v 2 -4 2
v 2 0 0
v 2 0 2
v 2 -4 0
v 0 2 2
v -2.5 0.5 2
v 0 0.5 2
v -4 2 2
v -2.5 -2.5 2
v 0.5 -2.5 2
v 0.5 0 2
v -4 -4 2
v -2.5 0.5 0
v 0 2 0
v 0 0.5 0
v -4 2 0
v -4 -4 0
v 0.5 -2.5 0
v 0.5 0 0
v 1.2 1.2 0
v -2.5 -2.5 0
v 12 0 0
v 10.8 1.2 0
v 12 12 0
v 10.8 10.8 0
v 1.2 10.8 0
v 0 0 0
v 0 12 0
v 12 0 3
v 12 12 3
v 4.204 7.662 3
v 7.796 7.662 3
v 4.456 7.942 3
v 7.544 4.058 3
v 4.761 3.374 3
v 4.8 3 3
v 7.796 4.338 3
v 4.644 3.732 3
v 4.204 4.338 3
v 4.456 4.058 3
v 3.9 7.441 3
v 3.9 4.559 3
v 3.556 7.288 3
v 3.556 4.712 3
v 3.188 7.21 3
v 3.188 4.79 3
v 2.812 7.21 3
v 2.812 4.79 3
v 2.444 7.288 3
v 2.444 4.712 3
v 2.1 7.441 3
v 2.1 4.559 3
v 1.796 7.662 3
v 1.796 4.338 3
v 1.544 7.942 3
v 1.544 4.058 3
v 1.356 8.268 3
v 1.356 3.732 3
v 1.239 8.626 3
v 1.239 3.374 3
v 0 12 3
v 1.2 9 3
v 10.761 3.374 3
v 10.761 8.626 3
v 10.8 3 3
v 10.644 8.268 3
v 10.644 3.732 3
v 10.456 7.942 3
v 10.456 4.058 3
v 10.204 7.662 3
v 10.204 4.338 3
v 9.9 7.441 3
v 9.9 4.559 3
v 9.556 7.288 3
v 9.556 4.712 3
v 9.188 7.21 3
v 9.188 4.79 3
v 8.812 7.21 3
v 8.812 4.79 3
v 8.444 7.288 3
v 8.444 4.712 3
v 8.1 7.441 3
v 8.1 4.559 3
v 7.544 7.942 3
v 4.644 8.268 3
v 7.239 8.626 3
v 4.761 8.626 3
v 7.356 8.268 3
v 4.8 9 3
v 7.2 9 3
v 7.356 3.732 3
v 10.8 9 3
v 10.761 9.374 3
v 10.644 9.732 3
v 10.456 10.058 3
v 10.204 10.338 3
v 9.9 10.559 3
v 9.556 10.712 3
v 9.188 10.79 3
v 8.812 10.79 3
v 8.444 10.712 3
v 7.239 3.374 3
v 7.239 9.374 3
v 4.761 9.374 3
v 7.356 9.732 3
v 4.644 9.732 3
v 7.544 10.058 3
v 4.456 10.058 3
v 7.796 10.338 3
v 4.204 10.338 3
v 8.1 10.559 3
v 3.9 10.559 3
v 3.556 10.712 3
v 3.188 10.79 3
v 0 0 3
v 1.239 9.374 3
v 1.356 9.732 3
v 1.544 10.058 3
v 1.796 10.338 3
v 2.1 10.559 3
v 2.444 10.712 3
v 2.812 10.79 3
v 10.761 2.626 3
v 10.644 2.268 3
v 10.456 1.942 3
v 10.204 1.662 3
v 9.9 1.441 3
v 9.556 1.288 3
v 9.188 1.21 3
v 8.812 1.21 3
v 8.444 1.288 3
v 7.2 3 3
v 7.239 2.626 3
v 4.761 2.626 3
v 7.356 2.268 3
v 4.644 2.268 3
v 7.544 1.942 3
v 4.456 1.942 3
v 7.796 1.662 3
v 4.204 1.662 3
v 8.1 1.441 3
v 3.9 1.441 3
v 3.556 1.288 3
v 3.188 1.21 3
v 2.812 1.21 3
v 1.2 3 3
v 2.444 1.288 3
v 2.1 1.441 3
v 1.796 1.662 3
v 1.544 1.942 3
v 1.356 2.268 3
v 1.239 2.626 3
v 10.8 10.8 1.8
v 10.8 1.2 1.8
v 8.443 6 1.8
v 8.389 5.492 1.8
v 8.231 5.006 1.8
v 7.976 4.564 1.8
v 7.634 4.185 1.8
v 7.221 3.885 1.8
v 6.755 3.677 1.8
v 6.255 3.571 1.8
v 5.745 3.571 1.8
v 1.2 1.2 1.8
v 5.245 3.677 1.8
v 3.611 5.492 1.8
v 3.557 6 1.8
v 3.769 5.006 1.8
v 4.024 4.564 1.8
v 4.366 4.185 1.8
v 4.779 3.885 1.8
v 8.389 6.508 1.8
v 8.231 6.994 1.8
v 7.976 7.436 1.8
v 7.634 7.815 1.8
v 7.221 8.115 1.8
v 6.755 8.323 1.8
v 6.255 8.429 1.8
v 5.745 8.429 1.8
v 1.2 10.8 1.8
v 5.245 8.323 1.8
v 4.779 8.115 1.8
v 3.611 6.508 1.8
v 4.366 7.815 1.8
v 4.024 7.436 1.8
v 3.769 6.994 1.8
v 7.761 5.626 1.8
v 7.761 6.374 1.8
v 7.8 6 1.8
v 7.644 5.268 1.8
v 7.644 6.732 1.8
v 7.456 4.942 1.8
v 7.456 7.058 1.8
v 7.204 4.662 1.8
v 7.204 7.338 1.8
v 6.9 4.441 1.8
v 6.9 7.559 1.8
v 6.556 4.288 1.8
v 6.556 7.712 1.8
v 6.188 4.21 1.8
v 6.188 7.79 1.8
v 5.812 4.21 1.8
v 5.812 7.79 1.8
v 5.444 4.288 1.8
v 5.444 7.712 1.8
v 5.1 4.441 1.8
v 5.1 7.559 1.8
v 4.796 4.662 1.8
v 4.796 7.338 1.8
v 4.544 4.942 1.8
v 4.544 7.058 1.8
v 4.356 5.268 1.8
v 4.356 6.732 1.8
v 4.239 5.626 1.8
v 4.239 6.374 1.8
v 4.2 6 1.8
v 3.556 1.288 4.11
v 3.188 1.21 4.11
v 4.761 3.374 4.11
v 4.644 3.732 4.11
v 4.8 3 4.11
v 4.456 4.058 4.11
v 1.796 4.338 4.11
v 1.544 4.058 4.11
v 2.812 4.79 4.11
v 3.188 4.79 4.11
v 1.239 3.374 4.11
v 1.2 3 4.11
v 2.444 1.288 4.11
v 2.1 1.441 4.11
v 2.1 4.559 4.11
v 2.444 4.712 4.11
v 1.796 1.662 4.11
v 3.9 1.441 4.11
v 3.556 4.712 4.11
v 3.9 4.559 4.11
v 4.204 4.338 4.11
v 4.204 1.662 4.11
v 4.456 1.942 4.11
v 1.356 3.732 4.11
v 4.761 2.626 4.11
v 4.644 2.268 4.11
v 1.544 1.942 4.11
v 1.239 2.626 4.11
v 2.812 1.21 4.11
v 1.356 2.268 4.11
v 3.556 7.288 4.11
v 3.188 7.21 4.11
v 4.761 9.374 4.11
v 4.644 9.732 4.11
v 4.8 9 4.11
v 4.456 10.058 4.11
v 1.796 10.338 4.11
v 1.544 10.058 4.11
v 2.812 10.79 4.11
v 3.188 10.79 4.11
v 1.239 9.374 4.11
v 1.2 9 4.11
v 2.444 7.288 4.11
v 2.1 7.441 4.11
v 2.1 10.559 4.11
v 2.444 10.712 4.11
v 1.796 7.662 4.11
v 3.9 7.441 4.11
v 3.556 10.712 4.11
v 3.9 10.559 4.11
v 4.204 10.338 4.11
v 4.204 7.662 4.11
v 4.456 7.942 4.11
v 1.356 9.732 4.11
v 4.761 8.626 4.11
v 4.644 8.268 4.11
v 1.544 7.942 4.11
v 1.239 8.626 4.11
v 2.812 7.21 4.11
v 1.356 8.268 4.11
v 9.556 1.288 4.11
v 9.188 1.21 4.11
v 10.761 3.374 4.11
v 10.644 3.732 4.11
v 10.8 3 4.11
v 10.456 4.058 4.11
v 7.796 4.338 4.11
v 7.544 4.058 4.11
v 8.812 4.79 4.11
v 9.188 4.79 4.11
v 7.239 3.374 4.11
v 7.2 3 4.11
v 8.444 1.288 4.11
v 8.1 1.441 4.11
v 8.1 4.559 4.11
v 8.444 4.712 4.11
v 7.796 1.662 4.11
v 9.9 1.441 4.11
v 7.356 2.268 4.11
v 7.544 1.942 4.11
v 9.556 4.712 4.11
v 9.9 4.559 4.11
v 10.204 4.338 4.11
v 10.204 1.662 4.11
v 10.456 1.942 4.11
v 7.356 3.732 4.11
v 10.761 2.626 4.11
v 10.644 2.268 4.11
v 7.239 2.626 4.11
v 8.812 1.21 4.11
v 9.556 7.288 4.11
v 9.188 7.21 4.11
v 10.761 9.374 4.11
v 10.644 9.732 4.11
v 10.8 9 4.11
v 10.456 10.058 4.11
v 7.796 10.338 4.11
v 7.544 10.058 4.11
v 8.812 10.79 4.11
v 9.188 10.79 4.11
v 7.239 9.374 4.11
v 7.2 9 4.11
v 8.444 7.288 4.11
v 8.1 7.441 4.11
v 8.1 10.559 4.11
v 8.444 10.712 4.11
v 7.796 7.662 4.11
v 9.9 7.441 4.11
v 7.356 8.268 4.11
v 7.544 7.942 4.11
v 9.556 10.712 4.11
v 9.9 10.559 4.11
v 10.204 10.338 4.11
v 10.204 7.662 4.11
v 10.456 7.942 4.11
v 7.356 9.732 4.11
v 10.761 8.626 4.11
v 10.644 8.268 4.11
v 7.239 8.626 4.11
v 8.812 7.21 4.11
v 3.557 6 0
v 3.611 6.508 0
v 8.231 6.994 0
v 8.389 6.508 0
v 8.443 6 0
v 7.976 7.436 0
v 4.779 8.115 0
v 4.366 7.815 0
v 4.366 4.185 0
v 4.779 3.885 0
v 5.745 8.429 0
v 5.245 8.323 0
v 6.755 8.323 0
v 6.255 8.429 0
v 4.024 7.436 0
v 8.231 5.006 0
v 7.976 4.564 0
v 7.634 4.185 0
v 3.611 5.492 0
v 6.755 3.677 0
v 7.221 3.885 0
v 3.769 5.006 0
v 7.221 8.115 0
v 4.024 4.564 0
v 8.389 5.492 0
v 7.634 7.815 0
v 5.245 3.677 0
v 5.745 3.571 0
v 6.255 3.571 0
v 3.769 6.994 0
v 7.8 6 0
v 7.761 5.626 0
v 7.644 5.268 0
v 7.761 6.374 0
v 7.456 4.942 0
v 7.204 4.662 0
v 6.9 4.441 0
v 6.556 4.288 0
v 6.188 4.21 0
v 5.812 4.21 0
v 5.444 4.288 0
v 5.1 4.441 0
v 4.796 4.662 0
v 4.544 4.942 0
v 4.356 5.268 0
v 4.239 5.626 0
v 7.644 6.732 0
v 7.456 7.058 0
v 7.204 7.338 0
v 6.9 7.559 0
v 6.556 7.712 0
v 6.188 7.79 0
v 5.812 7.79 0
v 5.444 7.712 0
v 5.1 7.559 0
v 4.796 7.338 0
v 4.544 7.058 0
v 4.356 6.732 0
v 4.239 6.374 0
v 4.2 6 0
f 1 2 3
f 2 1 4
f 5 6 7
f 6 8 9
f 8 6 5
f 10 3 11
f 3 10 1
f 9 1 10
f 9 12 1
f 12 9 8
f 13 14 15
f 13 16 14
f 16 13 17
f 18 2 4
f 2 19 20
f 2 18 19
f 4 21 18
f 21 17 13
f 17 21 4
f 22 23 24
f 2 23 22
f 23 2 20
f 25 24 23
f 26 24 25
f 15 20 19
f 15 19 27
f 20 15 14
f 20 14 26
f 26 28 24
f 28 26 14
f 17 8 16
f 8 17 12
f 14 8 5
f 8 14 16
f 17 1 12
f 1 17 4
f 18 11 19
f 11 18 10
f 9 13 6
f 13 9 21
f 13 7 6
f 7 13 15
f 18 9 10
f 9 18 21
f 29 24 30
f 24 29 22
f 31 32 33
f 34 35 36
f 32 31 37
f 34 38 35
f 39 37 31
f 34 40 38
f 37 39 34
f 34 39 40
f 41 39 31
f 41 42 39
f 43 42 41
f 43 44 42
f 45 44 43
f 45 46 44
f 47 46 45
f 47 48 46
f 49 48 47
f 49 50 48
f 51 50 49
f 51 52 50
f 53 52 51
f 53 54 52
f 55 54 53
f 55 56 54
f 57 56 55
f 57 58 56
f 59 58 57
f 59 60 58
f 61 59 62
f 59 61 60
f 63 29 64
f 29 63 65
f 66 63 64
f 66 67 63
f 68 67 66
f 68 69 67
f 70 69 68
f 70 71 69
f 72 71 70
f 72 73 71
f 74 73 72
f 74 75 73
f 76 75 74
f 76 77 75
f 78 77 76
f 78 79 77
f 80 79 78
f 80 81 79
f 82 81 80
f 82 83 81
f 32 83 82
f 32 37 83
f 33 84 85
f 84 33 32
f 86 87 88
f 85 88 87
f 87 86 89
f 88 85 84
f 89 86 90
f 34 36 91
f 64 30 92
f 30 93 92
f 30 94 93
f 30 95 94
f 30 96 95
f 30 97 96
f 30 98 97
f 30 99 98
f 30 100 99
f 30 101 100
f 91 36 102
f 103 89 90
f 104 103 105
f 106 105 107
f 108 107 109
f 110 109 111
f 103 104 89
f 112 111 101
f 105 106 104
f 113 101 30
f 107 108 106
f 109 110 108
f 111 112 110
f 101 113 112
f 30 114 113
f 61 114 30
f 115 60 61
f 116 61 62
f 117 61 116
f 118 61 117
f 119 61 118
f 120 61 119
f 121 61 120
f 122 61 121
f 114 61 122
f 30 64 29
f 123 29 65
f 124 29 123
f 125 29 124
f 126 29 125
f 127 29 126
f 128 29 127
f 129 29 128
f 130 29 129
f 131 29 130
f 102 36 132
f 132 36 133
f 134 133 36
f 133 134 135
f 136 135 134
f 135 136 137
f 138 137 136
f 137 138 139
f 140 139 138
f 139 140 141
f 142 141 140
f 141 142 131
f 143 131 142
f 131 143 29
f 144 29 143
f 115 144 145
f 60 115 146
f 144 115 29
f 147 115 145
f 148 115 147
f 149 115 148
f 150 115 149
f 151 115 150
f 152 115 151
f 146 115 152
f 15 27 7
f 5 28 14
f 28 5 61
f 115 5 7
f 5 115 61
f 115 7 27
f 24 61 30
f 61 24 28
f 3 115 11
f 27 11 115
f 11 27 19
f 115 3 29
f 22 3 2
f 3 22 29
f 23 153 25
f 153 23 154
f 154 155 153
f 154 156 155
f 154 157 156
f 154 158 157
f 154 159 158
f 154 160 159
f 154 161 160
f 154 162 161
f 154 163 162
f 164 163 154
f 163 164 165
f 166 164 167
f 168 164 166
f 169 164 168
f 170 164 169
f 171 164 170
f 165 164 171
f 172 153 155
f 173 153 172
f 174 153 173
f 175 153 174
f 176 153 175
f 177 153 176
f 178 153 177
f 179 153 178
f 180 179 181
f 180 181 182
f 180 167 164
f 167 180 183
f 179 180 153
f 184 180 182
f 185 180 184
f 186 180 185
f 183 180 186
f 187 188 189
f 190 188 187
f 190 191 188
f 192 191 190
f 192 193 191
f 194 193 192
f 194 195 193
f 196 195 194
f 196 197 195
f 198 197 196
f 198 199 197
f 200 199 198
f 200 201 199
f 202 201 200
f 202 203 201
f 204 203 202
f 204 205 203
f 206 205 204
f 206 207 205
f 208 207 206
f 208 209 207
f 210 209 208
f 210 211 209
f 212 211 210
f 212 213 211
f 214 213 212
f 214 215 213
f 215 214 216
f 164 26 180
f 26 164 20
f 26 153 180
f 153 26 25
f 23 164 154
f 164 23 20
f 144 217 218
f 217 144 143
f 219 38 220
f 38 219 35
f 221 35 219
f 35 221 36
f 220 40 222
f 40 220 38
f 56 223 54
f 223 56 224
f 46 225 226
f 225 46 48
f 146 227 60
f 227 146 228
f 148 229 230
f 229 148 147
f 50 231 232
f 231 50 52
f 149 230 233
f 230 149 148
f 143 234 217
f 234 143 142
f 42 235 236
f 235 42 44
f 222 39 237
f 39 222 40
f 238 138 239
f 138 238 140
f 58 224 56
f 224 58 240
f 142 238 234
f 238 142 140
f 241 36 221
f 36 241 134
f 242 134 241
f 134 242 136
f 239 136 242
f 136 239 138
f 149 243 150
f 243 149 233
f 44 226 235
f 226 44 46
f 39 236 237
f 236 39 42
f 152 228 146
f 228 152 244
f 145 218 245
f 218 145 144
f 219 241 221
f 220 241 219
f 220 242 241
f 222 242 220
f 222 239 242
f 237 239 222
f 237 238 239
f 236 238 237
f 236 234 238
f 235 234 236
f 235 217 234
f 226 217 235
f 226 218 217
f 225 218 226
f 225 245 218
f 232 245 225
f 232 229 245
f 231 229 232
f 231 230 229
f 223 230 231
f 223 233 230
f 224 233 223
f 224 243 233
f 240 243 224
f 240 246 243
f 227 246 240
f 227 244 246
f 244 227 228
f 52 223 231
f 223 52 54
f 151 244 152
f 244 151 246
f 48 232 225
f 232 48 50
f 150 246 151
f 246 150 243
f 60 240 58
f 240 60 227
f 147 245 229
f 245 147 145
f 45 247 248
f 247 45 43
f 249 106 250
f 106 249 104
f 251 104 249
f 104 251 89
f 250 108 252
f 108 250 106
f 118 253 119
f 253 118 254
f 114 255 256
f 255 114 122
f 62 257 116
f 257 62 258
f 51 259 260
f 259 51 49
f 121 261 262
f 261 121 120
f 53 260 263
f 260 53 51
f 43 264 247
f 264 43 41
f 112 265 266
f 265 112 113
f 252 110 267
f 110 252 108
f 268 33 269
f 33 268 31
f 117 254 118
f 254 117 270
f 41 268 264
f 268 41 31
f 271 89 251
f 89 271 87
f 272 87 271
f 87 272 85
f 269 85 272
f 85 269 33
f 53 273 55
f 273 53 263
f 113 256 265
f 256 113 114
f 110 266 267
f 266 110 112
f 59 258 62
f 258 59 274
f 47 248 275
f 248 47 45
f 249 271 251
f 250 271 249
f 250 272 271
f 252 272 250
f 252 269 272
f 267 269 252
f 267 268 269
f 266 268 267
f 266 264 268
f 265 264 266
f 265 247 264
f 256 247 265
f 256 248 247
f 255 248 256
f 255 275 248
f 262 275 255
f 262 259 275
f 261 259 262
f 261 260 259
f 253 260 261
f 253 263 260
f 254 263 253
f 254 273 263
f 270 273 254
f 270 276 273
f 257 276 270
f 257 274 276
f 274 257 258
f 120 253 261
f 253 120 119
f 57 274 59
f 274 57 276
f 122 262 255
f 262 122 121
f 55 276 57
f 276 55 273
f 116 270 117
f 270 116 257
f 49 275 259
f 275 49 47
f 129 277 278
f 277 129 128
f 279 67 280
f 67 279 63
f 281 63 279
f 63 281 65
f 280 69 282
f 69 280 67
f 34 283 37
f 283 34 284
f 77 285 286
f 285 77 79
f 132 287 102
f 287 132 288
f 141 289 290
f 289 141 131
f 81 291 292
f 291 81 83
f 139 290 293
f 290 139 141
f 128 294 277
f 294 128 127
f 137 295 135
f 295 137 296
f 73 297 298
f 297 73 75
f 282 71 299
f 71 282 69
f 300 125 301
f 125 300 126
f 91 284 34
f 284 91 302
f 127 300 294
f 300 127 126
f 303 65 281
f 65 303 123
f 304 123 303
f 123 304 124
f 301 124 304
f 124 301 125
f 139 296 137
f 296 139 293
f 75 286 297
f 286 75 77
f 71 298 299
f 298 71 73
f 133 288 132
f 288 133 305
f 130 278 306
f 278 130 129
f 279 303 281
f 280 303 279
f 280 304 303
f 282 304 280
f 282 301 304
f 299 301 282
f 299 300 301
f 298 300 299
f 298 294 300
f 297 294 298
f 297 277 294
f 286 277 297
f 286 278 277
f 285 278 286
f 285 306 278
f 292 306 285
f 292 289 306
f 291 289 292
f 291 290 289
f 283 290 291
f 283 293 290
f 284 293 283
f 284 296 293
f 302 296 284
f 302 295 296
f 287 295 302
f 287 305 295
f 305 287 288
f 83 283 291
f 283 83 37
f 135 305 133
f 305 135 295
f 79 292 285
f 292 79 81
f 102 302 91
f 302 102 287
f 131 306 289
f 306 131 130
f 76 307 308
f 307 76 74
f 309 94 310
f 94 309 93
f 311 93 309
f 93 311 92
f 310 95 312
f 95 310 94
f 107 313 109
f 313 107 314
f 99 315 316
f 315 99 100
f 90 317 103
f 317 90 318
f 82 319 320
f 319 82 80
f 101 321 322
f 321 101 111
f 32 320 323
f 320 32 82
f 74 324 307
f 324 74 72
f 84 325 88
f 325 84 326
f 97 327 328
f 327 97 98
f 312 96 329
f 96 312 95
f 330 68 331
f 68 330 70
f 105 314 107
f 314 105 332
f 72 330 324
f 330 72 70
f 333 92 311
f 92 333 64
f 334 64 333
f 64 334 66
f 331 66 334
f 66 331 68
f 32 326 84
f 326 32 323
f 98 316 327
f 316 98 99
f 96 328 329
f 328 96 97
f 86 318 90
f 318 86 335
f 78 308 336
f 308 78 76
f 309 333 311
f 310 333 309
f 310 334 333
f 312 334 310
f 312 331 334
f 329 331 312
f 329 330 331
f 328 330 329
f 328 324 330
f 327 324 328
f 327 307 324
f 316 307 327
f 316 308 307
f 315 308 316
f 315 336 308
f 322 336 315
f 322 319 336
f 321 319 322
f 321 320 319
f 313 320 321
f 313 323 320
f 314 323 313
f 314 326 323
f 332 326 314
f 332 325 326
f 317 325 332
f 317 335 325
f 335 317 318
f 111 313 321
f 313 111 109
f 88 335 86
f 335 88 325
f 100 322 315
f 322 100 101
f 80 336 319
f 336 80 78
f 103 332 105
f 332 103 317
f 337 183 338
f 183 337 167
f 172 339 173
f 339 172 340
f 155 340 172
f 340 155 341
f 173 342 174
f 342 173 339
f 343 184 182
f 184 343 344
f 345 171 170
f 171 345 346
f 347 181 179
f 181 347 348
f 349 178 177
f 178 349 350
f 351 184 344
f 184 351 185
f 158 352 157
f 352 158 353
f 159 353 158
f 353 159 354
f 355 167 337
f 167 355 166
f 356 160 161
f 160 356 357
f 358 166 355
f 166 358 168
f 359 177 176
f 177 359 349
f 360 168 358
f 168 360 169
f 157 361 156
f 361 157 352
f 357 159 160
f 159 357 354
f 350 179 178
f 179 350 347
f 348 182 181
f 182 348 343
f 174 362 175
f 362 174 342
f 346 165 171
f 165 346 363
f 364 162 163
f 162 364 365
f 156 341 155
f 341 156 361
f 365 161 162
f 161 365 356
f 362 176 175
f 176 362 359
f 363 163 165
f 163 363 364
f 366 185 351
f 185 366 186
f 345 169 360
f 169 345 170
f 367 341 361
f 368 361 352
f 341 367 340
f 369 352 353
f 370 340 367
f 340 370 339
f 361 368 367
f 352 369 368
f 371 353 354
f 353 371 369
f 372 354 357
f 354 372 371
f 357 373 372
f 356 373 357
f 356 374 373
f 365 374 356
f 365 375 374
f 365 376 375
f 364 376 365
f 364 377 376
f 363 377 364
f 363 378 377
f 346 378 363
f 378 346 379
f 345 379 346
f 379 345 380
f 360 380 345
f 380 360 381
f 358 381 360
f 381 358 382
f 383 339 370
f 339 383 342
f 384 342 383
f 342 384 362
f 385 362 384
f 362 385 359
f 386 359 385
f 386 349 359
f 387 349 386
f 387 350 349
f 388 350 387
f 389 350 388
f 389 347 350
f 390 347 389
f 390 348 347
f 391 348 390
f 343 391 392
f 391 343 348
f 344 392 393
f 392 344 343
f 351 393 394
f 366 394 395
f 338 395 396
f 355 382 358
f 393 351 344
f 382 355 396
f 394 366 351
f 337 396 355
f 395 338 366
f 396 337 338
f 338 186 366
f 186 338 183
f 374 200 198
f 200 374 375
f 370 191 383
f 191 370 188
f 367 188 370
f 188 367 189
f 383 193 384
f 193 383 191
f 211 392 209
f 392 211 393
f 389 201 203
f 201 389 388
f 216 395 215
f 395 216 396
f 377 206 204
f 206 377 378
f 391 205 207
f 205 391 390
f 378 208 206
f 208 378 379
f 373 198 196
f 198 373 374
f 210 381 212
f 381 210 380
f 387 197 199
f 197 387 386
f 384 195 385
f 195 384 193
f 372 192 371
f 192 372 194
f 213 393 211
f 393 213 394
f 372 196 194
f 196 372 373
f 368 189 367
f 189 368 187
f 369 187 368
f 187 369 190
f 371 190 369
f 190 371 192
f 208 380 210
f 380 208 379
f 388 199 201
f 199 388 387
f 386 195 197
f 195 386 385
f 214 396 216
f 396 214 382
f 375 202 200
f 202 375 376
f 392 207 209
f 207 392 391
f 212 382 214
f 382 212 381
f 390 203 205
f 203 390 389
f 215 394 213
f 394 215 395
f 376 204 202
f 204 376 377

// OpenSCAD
$fn=30;
lego_unit = 60;
lego_height = lego_unit/2;
lego_button_radius = 18;
lego_wall_width = lego_unit/2 - lego_button_radius;
lego_button_height = 2*lego_wall_width;
base_pin_radius = lego_wall_width;
base_circle_radius = (lego_unit*sqrt(2) - 2*lego_button_radius)/2;

module lego_brick(brick_length=4, brick_width=2){

union(){
	difference(){
		cube([lego_unit*brick_length, lego_unit*brick_width, lego_height]);

		translate([lego_wall_width, lego_wall_width, -lego_wall_width])
		  cube([lego_unit*brick_length - 2*lego_wall_width, lego_unit*brick_width - 2*lego_wall_width, lego_height]);
	}

	//buttons
	for (i = [0:brick_length-1]) {
		for (j = [0:brick_width-1]) {
			translate([lego_unit/2+i*lego_unit, lego_unit/2+j*lego_unit,lego_height+0.1]) cylinder(r=lego_button_radius,h=lego_button_height-2,center=true);
		}
	}

	if (brick_width==1){
		if (brick_length>1){
			//base pins
			for (i = [1:brick_length-1]) {
				translate([i*lego_unit, lego_unit/2, lego_height/2]) cylinder(r=base_pin_radius, h=lego_height, center=true);
			}
		}

		if (brick_length > 3){
			for (i = [1:(brick_length/2-1)]) {
				translate([i*2*lego_unit, lego_unit/2, lego_height/2+lego_wall_width/4]) cube([lego_wall_width, lego_unit,lego_height-lego_wall_width/2], center=true);
			}
		}
	} else {
		difference(){
			union(){
				//body of the base circles
				for (i = [1:brick_length-1]) {
					translate([i*lego_unit, lego_unit, lego_height/2])
					difference(){
						cylinder(r=base_circle_radius, h=lego_height, center=true);
					}
				}

				//inner walls
				if (brick_length > 3){
					for (i = [1:(brick_length/2-1)]) {
						translate([i*2*lego_unit, lego_unit, lego_height/2+lego_wall_width/2]) cube([lego_wall_width/4, 2*lego_unit,lego_height-lego_wall_width], center=true);
					}
				}
			}
			
			//holes of the base circles
			for (i = [1:brick_length-1]) {
				translate([i*lego_unit, lego_unit, lego_height/2])
				cylinder(r=lego_button_radius, h=lego_height+1, center=true);
			}

		}

	}
}

}

if (0){
translate([-1.4, -1.4]){
difference(){
	cylinder(r=4, h=2);
	translate([0, 0, -1]) cylinder(r=2, h=5);
}
}}


translate([-4, -4]){
difference(){
	cube([6, 6, 2]);
	translate([1.5, 1.5, -1]) cube([3, 3, 5]);
	translate([4.5, 4.5, -1]) cube([3, 3, 5]);
}
}

difference(){

scale(0.1){
lego_brick(2,2);
//translate([lego_unit,lego_unit,lego_unit/3]) lego_brick(2,2);
//translate([lego_unit*2,lego_unit*2]) lego_brick(2,2);
}
//	translate([1, 1, -1]) cylinder(r=2, h=10);
}
